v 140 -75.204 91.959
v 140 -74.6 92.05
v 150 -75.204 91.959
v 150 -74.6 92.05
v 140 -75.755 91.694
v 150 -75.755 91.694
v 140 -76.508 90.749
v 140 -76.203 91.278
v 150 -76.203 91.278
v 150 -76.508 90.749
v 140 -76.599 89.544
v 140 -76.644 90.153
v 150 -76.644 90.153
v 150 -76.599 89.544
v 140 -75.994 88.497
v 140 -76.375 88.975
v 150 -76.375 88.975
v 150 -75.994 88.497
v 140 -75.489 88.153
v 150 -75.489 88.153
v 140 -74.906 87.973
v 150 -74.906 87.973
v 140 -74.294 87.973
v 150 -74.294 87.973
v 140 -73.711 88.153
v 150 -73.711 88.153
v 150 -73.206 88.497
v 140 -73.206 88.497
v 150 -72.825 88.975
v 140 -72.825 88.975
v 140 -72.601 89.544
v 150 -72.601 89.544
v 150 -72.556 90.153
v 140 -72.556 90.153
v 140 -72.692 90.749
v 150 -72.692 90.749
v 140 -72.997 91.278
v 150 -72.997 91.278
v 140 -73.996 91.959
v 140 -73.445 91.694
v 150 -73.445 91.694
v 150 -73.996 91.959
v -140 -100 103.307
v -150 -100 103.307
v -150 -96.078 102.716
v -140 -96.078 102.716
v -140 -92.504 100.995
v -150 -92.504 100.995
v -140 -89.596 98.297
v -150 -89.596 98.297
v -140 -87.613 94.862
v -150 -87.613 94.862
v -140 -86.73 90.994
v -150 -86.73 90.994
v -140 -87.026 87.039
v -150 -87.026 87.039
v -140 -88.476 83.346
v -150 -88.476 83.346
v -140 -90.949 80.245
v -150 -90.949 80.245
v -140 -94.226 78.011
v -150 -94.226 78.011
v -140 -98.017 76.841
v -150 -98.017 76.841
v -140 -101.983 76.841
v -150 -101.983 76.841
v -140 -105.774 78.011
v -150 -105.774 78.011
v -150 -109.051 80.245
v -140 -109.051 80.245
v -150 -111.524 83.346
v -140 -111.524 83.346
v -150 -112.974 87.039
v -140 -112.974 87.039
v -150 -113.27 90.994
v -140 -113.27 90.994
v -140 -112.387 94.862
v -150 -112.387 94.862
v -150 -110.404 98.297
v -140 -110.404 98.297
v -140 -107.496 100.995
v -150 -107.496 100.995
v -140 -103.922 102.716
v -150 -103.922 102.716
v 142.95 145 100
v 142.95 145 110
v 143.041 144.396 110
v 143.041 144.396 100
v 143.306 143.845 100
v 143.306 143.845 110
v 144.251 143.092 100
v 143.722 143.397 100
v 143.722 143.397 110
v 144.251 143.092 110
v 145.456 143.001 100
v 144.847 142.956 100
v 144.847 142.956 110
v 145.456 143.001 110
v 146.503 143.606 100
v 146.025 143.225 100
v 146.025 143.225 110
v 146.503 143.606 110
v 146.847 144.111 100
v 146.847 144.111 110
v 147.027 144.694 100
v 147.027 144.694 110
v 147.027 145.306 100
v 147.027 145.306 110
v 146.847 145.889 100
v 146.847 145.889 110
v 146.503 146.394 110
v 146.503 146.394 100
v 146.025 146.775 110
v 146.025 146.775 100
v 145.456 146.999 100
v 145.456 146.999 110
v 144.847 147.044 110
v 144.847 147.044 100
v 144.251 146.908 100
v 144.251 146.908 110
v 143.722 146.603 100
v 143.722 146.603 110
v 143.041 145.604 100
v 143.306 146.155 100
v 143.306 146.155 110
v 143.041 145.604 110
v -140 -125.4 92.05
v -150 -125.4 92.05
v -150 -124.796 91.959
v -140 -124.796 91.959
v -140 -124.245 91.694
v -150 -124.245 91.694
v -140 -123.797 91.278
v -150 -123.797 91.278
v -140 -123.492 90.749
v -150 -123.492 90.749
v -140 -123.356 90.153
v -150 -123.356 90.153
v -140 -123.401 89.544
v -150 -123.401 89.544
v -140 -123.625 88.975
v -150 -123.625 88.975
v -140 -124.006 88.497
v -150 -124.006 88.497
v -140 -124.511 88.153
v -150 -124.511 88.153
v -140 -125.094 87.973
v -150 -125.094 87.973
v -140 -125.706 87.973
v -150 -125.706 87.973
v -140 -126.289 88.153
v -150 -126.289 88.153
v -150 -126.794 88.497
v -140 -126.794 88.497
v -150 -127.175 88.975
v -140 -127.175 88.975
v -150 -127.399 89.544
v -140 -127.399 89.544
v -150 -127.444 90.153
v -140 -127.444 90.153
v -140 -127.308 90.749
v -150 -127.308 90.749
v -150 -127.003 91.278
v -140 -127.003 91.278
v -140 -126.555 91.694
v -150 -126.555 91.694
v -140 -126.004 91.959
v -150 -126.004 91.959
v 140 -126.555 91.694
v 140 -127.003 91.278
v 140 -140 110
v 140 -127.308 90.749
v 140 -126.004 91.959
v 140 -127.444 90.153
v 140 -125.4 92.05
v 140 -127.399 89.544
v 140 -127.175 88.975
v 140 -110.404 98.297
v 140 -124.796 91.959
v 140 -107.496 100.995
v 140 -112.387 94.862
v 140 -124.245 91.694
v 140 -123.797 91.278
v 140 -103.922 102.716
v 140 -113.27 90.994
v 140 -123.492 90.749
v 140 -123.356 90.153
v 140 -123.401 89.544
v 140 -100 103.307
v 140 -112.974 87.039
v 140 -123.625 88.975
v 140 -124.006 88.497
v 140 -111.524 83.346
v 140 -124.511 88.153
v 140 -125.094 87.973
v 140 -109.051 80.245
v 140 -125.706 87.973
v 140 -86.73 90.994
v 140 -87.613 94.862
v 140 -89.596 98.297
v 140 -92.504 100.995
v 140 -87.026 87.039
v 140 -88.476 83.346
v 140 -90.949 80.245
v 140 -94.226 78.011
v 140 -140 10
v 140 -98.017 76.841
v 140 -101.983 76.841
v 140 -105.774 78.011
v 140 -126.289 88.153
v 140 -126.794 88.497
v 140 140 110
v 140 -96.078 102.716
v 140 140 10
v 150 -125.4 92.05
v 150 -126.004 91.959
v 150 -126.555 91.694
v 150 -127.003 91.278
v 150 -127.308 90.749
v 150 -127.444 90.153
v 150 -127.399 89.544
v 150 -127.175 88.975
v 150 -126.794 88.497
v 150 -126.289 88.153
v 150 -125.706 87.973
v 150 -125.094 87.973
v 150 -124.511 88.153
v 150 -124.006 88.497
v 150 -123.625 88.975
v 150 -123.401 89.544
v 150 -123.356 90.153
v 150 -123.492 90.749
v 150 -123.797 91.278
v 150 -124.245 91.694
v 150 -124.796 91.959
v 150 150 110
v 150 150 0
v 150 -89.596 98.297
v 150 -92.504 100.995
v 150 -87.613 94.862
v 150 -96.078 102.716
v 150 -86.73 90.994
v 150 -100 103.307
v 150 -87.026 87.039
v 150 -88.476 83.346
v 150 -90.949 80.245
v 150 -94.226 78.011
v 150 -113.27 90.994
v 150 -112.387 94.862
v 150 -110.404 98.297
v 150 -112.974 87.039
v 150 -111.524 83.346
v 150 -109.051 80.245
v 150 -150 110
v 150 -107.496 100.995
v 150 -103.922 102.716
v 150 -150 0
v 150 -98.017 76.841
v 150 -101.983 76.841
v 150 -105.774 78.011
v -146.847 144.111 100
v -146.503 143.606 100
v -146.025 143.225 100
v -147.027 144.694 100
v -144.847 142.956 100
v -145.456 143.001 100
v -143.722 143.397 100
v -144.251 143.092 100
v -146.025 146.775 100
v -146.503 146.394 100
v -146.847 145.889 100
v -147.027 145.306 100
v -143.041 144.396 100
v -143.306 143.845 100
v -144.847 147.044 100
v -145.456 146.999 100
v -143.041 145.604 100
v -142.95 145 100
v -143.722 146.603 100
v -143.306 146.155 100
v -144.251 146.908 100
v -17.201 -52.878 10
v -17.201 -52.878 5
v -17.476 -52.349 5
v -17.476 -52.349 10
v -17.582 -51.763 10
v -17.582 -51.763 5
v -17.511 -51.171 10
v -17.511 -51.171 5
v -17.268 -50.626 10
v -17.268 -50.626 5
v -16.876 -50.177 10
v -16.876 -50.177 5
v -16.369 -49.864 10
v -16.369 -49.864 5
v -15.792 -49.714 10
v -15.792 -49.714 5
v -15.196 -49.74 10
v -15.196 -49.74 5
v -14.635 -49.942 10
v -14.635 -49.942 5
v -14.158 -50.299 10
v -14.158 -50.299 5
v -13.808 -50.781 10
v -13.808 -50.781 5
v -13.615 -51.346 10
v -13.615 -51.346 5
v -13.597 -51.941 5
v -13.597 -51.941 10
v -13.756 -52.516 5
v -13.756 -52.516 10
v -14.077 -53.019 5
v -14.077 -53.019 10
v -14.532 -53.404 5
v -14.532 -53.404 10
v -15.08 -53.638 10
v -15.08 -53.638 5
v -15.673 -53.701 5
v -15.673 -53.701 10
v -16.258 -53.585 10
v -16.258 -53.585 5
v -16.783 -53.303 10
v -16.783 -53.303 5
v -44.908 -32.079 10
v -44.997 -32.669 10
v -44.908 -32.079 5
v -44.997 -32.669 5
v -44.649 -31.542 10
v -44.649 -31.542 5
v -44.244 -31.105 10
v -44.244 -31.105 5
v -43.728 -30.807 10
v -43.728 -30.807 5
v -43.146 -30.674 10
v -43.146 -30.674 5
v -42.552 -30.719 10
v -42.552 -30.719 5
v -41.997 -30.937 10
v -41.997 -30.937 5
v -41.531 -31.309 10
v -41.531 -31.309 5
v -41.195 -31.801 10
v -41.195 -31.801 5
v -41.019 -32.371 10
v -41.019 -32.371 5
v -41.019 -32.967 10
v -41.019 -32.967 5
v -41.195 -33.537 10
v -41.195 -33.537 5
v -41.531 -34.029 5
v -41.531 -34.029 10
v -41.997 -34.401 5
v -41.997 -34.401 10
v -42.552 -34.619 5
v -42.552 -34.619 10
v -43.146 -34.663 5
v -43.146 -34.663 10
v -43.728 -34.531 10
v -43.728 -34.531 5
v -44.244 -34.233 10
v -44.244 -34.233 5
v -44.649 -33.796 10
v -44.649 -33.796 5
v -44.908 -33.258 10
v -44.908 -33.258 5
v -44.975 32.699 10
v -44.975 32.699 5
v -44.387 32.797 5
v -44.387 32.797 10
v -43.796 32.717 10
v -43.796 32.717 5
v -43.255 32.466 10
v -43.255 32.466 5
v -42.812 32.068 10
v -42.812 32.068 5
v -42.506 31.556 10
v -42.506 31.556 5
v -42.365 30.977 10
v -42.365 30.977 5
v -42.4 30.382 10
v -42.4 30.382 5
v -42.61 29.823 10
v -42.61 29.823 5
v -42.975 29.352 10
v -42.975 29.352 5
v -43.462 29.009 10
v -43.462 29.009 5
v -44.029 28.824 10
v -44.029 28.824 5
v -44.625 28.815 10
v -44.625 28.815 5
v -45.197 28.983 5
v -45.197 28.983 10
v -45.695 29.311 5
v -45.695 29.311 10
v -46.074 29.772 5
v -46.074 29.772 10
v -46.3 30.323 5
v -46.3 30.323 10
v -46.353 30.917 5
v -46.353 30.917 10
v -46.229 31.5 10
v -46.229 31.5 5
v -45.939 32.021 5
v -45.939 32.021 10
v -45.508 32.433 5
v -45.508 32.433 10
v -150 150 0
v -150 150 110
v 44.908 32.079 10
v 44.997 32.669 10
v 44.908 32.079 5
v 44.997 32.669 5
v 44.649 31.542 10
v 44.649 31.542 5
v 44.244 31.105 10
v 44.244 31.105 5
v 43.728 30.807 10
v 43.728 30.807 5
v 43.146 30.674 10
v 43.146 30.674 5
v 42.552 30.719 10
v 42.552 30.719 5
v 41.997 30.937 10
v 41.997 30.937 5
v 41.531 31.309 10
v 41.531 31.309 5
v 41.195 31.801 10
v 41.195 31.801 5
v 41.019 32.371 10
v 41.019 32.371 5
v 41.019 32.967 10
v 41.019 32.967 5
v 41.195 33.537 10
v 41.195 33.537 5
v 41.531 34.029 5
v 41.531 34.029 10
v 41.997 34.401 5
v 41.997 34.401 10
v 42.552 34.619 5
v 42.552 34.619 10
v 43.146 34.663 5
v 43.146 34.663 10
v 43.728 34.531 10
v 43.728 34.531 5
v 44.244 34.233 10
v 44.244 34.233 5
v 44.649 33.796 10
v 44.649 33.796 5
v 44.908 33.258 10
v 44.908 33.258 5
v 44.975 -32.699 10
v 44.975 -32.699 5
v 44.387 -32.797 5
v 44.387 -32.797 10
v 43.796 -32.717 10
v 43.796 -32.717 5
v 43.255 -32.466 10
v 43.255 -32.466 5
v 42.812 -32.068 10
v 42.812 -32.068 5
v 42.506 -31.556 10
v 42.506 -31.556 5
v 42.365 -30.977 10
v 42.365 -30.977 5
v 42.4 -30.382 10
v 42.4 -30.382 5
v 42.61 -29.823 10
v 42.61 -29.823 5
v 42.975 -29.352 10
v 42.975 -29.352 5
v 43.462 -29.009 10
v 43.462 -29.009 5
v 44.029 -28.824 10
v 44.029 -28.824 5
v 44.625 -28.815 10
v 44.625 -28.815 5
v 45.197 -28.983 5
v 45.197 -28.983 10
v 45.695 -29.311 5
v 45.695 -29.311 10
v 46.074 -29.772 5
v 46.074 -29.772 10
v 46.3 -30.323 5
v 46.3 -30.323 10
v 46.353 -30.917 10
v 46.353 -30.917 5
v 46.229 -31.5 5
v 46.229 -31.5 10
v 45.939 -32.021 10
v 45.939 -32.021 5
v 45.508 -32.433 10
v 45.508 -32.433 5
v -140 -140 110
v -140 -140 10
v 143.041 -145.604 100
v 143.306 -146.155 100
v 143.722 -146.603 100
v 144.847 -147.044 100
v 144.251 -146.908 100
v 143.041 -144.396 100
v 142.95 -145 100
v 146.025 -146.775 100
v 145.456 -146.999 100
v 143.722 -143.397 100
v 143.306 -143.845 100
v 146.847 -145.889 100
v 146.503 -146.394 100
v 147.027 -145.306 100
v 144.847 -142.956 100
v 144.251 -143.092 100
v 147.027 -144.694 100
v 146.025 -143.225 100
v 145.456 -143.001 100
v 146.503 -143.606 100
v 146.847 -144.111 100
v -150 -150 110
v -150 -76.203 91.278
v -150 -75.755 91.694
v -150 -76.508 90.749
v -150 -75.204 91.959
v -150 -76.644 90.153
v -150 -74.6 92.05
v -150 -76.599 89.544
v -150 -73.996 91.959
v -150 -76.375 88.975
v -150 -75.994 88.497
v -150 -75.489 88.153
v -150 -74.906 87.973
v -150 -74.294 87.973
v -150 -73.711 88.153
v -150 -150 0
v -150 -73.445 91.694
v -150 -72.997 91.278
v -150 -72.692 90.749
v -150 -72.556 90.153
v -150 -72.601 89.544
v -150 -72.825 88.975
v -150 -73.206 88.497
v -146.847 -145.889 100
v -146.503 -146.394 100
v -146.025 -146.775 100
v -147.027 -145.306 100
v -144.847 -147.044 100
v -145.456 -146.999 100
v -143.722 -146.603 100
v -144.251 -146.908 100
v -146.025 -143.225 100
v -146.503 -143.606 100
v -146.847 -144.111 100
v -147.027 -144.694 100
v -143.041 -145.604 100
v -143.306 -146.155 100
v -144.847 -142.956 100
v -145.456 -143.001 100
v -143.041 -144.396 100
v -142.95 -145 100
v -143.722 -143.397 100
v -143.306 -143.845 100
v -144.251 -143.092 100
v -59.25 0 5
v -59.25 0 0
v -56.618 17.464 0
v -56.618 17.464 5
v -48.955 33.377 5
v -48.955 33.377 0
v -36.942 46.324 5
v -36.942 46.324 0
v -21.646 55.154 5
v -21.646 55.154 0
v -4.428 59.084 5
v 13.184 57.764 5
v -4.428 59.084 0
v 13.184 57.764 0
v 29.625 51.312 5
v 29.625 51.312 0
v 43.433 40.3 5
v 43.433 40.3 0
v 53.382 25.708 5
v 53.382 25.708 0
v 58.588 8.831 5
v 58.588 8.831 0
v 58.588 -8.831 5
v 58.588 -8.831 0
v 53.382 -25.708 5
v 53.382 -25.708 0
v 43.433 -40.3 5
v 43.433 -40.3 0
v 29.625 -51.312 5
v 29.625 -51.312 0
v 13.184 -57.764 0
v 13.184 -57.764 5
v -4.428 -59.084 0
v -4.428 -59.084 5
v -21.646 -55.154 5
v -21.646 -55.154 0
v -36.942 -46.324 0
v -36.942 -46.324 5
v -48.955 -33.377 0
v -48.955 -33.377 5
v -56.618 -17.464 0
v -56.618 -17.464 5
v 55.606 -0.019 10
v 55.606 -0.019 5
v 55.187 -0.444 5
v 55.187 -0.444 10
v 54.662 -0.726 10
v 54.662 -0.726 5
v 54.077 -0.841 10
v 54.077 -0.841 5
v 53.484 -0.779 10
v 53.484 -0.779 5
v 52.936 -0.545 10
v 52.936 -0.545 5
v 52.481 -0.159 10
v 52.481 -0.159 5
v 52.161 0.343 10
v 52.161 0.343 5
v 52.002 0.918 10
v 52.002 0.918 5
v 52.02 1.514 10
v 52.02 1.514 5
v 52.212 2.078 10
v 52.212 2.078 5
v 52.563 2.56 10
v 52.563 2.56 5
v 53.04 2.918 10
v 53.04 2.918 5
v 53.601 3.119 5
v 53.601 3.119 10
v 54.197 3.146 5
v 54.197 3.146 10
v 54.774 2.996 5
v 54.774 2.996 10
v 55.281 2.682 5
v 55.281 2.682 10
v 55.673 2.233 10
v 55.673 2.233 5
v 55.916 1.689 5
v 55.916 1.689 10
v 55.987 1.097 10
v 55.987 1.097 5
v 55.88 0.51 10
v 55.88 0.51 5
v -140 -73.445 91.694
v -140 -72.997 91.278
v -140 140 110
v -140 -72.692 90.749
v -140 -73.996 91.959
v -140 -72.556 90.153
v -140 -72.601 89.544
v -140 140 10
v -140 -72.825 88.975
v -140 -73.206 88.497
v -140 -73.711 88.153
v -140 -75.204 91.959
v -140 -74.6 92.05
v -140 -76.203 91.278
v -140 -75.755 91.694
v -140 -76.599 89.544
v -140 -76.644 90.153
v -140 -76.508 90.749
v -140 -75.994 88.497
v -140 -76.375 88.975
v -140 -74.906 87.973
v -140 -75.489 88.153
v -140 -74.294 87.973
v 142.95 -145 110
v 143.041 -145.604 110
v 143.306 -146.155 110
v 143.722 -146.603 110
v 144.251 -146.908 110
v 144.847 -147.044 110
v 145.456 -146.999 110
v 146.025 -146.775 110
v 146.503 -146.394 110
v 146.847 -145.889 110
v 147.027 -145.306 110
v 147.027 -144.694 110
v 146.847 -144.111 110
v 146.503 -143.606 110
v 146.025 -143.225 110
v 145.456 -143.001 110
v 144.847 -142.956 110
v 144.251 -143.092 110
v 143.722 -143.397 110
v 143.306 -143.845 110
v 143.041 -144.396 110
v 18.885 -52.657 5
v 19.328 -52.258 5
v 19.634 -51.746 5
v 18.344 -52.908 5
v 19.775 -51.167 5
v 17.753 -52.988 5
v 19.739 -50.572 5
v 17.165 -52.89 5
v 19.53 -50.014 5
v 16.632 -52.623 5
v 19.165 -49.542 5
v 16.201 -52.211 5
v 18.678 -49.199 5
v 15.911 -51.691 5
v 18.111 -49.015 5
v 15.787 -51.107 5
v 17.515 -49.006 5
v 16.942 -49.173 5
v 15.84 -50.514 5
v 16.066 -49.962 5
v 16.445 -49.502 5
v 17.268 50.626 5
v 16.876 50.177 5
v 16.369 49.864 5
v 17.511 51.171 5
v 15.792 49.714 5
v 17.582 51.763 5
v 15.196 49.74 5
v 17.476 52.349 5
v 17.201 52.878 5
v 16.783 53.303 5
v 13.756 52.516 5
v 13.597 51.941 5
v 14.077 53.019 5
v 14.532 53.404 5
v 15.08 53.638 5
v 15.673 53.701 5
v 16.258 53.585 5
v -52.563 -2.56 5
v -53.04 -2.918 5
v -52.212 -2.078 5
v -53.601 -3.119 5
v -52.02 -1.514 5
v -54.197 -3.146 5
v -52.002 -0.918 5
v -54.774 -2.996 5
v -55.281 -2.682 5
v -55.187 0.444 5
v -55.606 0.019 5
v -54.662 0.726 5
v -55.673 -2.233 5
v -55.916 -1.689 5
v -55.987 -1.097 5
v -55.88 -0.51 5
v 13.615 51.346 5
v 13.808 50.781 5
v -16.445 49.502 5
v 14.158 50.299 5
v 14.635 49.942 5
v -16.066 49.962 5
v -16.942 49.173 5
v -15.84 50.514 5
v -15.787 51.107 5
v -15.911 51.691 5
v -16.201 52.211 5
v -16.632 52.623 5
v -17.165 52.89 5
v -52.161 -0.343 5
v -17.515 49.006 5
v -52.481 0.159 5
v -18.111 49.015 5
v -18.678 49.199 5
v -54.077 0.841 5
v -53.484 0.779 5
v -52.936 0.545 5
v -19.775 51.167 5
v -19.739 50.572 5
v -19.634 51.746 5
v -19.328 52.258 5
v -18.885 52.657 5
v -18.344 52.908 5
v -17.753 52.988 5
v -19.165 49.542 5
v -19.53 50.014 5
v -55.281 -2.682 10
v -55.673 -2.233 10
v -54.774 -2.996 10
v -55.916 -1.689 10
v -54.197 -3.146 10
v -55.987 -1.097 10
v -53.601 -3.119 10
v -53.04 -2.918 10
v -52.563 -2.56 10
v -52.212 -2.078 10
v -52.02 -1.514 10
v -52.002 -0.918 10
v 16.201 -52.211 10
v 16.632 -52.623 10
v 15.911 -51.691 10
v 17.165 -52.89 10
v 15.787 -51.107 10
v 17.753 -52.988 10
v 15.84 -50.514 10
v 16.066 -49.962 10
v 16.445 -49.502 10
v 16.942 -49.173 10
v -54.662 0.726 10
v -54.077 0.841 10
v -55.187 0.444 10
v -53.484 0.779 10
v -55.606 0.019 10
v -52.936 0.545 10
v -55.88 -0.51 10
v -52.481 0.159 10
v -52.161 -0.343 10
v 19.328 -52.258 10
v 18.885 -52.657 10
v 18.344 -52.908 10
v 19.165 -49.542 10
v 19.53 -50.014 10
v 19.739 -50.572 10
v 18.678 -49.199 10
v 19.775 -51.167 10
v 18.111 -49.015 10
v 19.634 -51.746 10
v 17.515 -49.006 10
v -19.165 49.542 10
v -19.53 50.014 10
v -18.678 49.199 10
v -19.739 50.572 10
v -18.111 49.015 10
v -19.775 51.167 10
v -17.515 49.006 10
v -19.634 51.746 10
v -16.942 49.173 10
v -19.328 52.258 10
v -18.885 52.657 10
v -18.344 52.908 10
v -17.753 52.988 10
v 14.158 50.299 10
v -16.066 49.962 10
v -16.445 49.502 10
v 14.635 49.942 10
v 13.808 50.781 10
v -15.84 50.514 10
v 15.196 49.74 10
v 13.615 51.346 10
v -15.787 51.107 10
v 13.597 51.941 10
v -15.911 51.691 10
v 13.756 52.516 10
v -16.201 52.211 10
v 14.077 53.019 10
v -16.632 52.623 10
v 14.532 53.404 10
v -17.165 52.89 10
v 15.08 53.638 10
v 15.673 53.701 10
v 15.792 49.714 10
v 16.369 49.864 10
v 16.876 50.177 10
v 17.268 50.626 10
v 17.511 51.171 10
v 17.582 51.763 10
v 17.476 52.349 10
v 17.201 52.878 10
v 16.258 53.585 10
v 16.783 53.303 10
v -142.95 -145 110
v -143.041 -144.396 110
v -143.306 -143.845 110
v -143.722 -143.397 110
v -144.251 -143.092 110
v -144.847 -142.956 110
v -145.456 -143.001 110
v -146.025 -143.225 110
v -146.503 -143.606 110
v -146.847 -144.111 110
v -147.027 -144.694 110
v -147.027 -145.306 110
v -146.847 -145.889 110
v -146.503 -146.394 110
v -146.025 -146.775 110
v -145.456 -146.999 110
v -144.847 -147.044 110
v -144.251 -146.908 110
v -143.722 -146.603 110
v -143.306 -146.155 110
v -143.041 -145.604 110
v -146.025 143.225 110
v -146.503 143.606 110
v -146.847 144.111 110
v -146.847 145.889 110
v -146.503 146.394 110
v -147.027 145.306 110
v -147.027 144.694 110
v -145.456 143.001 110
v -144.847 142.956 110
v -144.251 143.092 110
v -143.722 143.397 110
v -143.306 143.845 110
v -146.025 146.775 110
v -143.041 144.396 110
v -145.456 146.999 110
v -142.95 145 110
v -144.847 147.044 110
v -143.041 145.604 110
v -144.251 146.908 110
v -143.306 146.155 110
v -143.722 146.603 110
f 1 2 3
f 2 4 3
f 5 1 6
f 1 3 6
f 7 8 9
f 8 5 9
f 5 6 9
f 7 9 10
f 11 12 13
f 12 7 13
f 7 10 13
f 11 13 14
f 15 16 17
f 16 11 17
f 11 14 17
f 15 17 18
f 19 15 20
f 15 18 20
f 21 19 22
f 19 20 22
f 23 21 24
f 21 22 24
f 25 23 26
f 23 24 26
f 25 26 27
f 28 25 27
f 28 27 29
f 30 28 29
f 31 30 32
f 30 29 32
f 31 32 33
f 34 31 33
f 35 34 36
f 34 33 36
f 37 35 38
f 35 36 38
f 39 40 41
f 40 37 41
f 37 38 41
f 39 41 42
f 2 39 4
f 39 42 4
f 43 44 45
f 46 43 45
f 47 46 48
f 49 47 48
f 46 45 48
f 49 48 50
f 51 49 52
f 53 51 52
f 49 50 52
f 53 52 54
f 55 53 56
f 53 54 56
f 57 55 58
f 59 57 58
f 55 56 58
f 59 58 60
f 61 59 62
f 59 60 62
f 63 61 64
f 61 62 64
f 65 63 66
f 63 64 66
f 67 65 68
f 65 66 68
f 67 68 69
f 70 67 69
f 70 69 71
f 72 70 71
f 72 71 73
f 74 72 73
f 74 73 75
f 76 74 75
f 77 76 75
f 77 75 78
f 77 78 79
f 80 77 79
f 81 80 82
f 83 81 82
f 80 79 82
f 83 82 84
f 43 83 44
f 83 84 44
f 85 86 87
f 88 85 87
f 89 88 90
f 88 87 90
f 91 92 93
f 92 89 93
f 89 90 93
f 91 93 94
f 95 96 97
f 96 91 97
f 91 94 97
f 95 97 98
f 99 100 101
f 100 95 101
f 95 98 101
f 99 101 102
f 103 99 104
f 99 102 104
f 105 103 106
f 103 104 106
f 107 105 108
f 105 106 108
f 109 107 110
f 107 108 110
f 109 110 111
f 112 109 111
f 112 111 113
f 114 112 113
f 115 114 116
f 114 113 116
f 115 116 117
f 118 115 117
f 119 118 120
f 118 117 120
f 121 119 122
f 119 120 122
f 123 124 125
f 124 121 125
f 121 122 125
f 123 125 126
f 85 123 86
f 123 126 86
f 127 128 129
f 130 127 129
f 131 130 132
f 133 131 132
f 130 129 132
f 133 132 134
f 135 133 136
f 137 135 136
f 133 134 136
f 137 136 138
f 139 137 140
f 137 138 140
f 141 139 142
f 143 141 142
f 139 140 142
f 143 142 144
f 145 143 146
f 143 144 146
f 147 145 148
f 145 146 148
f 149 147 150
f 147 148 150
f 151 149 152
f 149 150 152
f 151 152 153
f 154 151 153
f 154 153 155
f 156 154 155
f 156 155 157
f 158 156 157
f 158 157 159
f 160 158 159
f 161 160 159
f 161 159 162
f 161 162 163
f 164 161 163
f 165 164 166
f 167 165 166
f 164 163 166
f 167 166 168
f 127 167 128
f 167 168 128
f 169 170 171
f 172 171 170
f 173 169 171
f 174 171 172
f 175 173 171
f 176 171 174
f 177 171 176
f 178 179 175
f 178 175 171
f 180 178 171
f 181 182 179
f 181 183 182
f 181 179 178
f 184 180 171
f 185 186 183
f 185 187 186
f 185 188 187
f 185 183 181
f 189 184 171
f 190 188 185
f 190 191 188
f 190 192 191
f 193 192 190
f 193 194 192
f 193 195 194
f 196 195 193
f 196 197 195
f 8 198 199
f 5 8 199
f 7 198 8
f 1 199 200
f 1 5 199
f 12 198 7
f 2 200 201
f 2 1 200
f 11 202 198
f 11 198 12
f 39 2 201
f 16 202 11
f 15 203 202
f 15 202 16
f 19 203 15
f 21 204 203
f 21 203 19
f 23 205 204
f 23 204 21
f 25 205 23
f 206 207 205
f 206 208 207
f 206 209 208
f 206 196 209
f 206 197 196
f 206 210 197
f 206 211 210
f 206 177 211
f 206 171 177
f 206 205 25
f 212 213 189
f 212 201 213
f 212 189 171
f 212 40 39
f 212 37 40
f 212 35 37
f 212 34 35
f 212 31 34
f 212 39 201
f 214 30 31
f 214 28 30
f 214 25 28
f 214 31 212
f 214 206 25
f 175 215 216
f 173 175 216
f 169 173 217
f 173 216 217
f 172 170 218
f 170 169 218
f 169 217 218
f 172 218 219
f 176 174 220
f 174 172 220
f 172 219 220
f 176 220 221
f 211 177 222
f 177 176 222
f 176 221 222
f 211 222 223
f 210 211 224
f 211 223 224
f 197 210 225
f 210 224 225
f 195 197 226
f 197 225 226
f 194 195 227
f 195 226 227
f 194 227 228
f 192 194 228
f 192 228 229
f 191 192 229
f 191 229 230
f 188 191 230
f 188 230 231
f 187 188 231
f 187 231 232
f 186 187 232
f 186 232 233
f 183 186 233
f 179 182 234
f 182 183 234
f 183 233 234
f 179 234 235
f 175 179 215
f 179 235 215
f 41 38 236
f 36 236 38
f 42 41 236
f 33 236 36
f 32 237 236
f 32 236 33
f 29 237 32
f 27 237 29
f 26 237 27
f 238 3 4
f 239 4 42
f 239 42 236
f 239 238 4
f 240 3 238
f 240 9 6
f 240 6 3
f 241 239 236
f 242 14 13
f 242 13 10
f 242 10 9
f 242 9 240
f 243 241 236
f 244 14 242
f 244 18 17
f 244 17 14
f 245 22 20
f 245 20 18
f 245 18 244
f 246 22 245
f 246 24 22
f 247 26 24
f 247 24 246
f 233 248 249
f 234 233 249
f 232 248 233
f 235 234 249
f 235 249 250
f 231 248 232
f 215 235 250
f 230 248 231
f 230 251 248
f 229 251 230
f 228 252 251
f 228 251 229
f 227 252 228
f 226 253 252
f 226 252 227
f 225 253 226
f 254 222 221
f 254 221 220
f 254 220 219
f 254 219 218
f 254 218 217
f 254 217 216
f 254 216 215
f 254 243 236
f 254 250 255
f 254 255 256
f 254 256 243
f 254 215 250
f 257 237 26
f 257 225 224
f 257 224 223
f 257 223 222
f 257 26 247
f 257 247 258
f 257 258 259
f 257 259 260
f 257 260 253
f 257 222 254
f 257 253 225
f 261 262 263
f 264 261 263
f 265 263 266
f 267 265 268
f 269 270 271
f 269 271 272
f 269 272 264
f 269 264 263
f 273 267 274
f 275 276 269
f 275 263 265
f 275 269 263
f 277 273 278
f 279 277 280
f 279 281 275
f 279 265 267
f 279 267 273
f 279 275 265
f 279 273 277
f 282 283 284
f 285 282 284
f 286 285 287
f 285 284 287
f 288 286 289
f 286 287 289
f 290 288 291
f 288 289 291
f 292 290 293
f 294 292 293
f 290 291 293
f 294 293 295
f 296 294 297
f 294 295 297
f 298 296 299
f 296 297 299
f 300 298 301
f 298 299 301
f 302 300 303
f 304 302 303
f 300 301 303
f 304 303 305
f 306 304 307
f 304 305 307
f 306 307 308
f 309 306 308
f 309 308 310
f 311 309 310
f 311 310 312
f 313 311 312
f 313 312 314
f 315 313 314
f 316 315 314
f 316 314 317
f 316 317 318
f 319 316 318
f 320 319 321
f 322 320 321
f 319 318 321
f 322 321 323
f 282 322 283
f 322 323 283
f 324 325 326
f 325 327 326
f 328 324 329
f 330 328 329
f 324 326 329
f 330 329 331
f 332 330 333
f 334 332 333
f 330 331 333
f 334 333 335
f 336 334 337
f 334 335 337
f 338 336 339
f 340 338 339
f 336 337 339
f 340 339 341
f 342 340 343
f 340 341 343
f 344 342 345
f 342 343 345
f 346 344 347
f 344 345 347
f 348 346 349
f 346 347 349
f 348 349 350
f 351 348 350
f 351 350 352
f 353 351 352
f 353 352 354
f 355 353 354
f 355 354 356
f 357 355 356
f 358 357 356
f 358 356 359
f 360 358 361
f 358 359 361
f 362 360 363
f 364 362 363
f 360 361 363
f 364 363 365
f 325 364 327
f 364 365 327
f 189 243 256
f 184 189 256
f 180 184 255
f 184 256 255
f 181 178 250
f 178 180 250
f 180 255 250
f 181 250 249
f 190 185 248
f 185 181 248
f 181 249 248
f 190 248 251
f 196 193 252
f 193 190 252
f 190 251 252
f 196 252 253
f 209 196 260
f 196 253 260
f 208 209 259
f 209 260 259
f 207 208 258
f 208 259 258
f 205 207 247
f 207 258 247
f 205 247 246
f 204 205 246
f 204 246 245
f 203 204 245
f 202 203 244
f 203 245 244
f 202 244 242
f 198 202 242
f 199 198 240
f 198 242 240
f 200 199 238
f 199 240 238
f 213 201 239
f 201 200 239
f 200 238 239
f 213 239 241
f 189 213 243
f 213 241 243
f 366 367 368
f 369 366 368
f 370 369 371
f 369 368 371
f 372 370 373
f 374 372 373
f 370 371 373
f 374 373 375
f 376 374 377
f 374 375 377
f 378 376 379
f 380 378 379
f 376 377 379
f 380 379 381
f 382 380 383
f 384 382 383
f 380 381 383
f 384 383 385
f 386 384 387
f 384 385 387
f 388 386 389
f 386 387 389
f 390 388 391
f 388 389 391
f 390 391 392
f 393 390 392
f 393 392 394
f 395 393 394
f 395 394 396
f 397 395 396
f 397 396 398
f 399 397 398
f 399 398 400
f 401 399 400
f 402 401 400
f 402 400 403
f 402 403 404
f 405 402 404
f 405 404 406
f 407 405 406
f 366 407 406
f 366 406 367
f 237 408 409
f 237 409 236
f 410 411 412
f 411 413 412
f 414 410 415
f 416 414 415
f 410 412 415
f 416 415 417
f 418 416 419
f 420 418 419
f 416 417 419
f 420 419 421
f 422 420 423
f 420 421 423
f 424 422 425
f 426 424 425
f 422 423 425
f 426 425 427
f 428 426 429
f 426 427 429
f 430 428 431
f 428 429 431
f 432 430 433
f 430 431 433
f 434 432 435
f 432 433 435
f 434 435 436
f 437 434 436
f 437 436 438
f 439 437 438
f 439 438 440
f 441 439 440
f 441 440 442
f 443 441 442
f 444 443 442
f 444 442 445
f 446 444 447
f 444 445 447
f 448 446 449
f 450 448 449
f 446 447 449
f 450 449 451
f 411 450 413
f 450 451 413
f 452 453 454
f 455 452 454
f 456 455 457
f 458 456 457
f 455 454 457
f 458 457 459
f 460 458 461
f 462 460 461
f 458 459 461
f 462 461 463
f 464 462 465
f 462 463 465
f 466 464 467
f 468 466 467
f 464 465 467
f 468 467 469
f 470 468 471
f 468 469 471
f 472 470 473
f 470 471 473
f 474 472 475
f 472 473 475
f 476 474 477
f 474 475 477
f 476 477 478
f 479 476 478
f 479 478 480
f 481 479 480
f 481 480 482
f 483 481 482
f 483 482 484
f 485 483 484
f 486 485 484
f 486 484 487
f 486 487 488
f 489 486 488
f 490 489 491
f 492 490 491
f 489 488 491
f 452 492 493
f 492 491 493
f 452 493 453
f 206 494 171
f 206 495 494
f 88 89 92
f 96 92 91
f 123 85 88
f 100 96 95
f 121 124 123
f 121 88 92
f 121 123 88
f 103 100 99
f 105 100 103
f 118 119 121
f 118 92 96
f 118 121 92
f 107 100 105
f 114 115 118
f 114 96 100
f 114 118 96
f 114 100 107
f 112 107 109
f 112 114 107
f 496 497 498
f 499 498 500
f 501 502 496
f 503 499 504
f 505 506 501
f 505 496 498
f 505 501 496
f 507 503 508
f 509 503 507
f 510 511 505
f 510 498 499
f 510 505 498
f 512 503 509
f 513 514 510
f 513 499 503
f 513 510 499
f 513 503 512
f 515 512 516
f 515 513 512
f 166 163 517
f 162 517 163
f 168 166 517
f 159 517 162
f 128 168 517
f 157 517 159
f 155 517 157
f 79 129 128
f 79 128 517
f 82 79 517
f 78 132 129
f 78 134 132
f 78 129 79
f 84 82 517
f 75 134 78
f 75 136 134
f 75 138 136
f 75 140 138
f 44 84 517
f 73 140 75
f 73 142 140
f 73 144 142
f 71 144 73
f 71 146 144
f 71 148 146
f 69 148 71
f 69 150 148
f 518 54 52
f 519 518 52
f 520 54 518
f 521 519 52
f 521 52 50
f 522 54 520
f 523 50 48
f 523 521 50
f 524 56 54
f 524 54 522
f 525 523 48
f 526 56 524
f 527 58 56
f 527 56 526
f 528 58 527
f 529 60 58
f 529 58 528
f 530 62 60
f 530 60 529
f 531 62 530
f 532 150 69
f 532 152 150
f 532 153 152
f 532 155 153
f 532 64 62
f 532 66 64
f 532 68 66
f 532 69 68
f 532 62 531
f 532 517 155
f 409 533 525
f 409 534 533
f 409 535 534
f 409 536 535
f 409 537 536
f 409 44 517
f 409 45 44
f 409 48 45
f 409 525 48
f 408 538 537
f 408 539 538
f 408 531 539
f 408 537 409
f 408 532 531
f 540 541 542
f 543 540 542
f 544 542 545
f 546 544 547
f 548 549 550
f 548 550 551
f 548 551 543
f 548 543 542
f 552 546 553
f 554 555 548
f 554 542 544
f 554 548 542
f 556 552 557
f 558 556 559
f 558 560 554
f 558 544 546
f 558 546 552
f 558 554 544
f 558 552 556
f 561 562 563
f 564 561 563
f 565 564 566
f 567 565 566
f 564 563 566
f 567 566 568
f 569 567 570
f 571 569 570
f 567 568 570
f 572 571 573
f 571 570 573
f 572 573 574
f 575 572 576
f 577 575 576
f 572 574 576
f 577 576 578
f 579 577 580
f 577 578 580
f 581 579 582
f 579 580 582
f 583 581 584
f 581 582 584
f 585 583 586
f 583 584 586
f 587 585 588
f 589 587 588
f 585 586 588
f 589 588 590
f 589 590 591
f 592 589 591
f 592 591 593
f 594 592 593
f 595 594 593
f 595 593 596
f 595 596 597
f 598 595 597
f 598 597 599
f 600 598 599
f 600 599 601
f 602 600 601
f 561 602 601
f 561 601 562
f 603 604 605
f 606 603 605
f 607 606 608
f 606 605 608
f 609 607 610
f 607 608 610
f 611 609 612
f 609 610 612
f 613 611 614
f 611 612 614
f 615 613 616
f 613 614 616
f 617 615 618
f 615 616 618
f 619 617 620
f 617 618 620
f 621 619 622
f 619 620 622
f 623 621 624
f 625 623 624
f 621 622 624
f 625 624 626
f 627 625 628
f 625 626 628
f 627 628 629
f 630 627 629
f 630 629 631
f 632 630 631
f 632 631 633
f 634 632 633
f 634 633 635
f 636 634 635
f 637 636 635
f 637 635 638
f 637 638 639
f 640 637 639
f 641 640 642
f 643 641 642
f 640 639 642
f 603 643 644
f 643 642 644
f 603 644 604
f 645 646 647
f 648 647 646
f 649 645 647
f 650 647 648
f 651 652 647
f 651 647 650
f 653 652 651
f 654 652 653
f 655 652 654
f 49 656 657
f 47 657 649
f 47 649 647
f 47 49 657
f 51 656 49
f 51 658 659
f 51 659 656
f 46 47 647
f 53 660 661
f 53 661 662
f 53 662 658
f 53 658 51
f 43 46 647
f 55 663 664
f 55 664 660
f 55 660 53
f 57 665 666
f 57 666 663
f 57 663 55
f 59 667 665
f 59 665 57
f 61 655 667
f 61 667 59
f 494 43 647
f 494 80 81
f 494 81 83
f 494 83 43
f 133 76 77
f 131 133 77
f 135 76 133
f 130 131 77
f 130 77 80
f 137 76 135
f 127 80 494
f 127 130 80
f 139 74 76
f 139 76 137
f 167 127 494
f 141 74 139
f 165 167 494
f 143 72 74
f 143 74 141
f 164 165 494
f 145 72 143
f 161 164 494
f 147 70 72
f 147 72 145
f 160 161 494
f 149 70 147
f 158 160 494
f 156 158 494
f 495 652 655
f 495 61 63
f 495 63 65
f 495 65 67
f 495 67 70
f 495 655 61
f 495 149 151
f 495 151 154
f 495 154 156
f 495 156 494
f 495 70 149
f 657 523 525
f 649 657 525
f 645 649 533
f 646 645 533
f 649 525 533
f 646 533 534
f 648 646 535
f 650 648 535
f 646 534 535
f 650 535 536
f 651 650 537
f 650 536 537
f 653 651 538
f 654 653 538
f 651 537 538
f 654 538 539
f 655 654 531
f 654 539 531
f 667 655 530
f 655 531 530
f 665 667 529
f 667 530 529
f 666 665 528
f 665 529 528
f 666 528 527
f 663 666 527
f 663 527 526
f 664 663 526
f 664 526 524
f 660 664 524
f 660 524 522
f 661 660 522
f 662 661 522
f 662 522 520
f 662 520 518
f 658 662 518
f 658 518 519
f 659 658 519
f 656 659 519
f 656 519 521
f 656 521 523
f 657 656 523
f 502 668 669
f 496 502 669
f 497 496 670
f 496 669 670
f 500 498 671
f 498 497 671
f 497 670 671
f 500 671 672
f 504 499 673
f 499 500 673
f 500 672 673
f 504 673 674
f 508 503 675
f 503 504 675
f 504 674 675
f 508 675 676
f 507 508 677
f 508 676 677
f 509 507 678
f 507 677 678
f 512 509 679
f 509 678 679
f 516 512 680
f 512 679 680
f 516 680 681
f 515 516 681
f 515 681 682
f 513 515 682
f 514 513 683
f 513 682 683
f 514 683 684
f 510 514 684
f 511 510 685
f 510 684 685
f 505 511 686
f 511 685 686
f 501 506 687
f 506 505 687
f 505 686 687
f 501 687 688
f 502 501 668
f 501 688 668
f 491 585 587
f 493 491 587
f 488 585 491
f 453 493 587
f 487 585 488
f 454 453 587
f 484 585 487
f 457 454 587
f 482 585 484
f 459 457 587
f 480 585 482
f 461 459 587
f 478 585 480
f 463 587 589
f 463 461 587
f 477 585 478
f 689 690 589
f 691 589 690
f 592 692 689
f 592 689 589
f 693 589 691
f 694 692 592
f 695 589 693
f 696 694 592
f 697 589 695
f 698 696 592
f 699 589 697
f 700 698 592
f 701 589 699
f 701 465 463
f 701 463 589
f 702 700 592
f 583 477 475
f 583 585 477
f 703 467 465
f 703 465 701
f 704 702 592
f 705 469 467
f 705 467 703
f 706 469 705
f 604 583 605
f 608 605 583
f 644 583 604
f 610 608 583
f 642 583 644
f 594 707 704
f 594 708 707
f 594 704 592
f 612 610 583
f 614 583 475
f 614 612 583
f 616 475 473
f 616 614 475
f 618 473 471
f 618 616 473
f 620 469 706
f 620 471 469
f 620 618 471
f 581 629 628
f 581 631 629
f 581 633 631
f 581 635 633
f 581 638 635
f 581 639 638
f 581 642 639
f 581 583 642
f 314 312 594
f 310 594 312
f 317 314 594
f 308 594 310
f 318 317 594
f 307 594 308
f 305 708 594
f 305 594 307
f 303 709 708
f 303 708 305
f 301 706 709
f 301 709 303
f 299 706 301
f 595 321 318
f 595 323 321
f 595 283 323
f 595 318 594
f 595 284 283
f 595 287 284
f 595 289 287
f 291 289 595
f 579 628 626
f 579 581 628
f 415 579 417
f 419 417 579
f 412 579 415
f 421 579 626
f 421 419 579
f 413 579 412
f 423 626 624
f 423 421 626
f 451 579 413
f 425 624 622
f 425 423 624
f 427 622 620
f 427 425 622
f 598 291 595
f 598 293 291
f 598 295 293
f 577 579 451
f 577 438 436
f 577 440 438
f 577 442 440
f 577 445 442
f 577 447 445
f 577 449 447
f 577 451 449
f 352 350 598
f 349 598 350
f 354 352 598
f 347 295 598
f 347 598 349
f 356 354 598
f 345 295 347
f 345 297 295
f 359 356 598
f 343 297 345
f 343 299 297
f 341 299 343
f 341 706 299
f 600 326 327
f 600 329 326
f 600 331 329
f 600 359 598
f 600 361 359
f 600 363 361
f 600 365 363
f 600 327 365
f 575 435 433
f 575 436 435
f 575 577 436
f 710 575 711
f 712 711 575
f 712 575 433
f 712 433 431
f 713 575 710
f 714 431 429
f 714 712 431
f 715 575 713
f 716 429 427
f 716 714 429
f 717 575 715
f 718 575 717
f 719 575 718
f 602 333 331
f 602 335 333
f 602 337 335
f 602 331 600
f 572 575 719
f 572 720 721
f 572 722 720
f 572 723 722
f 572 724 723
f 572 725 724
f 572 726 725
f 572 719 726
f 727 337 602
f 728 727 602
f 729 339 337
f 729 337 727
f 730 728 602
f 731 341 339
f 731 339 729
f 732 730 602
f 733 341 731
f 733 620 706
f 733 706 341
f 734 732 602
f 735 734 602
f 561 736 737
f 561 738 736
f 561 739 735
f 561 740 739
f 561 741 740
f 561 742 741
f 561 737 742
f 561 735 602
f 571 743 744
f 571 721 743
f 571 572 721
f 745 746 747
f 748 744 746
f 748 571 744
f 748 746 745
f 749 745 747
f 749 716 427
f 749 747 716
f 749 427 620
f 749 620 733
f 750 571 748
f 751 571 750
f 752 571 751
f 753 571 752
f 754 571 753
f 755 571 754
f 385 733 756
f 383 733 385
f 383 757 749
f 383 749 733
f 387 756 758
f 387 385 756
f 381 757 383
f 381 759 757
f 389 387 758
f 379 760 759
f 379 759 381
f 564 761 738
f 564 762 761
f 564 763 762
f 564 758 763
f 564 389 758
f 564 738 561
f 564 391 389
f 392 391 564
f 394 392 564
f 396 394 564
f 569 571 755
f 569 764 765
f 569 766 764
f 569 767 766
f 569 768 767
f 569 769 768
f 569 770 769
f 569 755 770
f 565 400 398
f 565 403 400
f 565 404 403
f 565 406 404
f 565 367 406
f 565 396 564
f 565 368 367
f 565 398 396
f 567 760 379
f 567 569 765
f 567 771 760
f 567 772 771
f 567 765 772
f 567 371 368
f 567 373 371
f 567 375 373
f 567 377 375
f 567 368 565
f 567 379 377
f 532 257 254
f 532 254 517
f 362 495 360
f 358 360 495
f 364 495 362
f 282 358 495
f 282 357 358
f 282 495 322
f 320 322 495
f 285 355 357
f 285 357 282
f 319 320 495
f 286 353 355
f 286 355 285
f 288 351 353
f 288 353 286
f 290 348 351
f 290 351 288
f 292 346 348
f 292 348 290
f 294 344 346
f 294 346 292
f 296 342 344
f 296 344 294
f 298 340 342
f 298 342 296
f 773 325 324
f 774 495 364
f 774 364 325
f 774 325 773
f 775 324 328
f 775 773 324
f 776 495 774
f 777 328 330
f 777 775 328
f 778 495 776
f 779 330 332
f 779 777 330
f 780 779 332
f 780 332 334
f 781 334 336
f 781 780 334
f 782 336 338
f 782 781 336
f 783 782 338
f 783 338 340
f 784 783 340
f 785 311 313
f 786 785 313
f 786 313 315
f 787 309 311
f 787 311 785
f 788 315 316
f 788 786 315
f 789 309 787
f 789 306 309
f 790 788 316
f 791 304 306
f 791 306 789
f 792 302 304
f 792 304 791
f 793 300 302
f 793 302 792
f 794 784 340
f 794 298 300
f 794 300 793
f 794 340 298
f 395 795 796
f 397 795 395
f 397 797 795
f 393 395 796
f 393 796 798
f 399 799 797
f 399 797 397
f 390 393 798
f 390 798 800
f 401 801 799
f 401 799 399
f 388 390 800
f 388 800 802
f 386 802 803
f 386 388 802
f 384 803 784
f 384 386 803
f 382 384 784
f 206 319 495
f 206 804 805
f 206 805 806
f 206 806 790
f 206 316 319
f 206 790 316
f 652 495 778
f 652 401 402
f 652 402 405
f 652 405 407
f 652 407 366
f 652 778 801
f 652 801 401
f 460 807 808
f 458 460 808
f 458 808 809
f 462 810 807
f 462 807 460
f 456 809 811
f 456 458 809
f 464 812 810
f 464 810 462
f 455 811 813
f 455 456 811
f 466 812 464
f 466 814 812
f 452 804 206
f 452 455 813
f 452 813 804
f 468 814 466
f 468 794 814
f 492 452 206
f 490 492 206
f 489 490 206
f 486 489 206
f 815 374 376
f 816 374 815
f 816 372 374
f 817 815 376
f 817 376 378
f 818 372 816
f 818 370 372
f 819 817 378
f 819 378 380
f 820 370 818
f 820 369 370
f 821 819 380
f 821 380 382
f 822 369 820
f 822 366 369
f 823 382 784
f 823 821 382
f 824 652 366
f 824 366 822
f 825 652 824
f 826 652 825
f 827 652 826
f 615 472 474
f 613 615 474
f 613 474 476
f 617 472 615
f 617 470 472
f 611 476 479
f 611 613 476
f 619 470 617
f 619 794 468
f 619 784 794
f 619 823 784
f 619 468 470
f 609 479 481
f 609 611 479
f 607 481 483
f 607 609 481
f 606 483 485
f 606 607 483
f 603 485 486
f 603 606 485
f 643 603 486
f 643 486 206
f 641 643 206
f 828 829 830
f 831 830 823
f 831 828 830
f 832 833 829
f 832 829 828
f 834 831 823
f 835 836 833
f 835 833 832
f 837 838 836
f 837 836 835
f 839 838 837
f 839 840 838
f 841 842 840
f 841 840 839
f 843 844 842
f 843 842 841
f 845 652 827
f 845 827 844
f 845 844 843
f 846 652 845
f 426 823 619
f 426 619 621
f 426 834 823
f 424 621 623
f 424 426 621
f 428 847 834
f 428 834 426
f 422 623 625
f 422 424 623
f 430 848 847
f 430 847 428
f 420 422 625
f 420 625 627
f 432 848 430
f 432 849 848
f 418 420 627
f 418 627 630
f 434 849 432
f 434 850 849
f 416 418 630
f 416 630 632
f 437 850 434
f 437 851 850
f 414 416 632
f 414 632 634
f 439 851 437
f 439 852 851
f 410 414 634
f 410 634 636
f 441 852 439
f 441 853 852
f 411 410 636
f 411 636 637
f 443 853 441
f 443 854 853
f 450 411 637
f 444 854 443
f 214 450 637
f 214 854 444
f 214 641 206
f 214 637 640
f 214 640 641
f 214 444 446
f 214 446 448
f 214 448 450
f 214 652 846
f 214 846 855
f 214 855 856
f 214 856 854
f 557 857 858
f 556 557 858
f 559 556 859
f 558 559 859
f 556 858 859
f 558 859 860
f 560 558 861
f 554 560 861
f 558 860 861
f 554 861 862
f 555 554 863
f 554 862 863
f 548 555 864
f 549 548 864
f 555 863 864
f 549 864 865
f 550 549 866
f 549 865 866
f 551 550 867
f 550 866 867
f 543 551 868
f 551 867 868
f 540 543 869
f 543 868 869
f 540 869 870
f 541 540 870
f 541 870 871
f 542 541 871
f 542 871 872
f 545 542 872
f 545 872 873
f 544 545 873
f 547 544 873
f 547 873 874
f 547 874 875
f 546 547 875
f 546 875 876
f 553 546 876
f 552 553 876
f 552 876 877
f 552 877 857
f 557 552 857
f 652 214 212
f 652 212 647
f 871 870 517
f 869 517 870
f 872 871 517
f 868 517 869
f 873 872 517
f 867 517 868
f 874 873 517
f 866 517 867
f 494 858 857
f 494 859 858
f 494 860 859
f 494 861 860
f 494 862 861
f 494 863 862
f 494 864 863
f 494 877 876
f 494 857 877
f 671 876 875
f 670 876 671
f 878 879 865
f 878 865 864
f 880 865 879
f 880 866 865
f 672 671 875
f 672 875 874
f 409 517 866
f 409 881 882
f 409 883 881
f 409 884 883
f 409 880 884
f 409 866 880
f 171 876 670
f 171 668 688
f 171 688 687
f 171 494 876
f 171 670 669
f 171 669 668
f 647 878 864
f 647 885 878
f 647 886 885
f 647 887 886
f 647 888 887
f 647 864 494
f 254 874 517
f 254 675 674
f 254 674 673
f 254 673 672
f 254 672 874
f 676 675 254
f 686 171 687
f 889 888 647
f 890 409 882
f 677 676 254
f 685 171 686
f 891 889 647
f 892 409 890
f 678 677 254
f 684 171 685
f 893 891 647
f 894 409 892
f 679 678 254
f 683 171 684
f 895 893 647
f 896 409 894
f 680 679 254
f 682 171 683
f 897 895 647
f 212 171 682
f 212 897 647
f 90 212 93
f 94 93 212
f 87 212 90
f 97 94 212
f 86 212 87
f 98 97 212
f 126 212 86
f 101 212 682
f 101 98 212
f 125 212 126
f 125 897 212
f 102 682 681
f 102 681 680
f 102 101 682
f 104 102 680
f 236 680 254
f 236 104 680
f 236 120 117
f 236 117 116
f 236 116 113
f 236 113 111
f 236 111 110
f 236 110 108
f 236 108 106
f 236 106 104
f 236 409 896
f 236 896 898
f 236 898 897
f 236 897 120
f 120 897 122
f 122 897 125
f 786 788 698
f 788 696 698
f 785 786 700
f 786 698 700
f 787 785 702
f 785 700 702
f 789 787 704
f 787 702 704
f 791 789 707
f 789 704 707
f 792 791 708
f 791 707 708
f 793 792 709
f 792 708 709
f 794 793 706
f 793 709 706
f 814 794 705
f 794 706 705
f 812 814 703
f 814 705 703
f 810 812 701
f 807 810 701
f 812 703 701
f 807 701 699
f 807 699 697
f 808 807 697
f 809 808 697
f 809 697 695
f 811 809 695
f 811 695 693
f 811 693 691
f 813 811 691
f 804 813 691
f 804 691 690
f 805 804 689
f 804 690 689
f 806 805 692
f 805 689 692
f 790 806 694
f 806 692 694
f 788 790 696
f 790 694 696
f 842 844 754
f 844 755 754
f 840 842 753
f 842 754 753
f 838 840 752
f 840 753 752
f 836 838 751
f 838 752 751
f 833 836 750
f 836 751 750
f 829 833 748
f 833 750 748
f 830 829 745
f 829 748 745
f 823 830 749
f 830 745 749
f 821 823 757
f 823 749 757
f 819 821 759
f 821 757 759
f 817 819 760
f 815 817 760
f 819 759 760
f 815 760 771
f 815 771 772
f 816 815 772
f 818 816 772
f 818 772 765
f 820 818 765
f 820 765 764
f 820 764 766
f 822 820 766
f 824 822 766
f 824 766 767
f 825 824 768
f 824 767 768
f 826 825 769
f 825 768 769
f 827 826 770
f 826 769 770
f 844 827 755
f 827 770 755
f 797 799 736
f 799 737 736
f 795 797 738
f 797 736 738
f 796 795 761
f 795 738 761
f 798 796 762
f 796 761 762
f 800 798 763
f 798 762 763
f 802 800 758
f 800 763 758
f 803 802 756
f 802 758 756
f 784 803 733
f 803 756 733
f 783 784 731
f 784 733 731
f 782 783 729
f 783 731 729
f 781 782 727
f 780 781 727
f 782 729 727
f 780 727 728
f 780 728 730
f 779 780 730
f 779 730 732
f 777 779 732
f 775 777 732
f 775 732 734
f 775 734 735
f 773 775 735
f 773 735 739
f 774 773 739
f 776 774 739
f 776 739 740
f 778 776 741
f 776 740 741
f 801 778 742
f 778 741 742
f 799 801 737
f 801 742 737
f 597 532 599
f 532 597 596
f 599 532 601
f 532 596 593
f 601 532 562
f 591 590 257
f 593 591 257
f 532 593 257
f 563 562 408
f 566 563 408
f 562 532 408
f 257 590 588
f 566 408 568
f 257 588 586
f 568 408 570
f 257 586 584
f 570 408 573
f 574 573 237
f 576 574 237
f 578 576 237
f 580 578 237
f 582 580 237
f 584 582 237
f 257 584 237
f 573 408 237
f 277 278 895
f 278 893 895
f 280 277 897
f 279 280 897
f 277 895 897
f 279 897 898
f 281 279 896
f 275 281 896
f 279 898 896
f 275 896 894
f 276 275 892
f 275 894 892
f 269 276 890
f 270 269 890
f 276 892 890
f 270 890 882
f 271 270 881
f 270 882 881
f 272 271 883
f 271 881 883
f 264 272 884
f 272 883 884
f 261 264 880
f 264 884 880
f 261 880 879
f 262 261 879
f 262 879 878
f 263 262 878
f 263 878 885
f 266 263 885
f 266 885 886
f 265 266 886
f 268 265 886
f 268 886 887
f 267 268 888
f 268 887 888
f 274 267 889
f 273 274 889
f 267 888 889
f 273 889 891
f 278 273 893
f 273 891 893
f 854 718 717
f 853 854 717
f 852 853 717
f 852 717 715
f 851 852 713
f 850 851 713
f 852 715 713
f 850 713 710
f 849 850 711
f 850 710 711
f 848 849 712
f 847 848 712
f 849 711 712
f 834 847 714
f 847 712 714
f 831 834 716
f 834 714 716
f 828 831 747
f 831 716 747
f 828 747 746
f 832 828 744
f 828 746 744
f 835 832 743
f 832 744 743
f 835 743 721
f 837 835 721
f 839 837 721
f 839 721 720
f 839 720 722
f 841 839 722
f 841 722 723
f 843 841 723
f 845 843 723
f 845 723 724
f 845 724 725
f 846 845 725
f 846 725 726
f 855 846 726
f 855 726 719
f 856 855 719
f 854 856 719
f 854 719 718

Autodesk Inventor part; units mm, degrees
ref_plane "YZ Plane" through (0, 0, 0) normal (1, 0, 0) x (0, 1, 0)
ref_plane "XZ Plane" through (0, 0, 0) normal (0, 1, 0) x (-1, 0, 0)
ref_plane "XY Plane" through (0, 0, 0) normal (0, 0, 1) x (1, 0, 0)
sketch "Sketch1" plane through (0, 0, 0) normal (0, 0, 1) x (1, 0, 0)
  line L0 (-150, 150) -> (150, 150)
  line L1 (150, 150) -> (150, -150)
  line L2 (150, -150) -> (-150, -150)
  line L3 (-150, -150) -> (-150, 150)
  point P0 (0, 0)
  point P1 (150, 0)
  point P2 (0, 150)
  dimension "d0" = 300
  dimension "d1" = 300
extrude "Extrusion1" add sketch "Sketch1" along normal blind 10
sketch "Sketch2" plane through (0, 0, 10) normal (0, 0, 1) x (1, 0, 0)
  line L0 (-150, 150) -> (150, 150)
  line L1 (150, 150) -> (150, -150)
  line L2 (150, -150) -> (-150, -150)
  line L3 (-150, -150) -> (-150, 150)
  line L4 (140, 140) -> (-140, 140)
  line L5 (-140, 140) -> (-140, -140)
  line L6 (-140, -140) -> (140, -140)
  line L7 (140, -140) -> (140, 140)
  point P0 (0, 0)
  dimension "d4" = 10
extrude "Extrusion2" add sketch "Sketch2" along normal blind 100
sketch "Sketch3" plane through (-150, -150, 0) normal (-1, 0, 0) x (0, 0, 1)
  circle A0 centre (60, 250) radius 12.5
  circle A1 centre (90, 50) radius 13.3073
  line L0 (0, 300) -> (110, 300) projected
  line L1 (0, 0) -> (110, 0) projected
  line L2 (110, 300) -> (110, 0) projected
  point P0 (0, 150)
  dimension "d7" = 25
  dimension "d8" = 50
  dimension "d9" = 50
  dimension "d10" = 20
  dimension "d11" = 50
sketch "Sketch6" plane through (0, 0, 0) normal (0, 0, -1) x (-1, 0, 0)
  circle A0 centre (0, 0) radius 59.25
  dimension "d21" = 118.5
extrude "Extrusion6" cut sketch "Sketch6" against normal blind 5
sketch "Sketch7" plane through (0, 0, 5) normal (0, 0, -1) x (-1, 0, 0)
  circle A0 centre (42.997, -32.6689) radius 2
  line L0 (42.997, -32.6689) -> (0, 0) construction
  dimension "d24" = 54
  dimension "d25" = 4
extrude "Extrusion7" cut sketch "Sketch7" against normal up to surface (5 mm away)
pattern_circular "Circular Pattern1" count 10 over 360 about axis through (0, 0, 5) along (0, 0, 1) of "Extrusion7"
extrude "Extrusion8" cut sketch "Sketch3" against normal blind 10 contours A1
sketch "Sketch8" plane through (-150, -150, 0) normal (-1, 0, 0) x (0, 0, 1)
  circle A0 centre (90, 75.4) radius 2.05
  circle A1 centre (90, 24.6) radius 2.05
  line L0 (90, 24.6) -> (90, 75.4) construction
  line L1 (0, 0) -> (0, 300) construction
  circle A2 centre (90, 50) radius 13.3073 construction
  circle A3 centre (90, 50) radius 13.3073 construction
  point P0 (0, 150)
  dimension "d33" = 4.1
  dimension "d34" = 4.1
  dimension "d35" = 50.8
  dimension "d37" = 0
extrude "Extrusion9" cut sketch "Sketch8" against normal blind 10
sketch "Sketch9" plane through (0, 0, 110) normal (0, 0, 1) x (1, 0, 0)
  circle A0 centre (-145, -145) radius 2.05
  circle A1 centre (-145, 145) radius 2.05
  line L0 (-145, -145) -> (-145, 145) construction
  line L1 (-150, 150) -> (-150, -150) construction
  line L2 (-150, -150) -> (150, -150) construction
  point P0 (0, 0)
  point P1 (-145, 0)
  point P2 (-150, 0)
  dimension "d40" = 4.1
  dimension "d41" = 4.1
  dimension "d42" = 5
  dimension "d44" = 5
extrude "Extrusion10" cut sketch "Sketch9" against normal blind 10
mirror "Mirror2" about plane through (0, 0, 0) normal (1, 0, 0) of "Extrusion8", "Extrusion9", "Extrusion10"
properties part number "locomotion box"
